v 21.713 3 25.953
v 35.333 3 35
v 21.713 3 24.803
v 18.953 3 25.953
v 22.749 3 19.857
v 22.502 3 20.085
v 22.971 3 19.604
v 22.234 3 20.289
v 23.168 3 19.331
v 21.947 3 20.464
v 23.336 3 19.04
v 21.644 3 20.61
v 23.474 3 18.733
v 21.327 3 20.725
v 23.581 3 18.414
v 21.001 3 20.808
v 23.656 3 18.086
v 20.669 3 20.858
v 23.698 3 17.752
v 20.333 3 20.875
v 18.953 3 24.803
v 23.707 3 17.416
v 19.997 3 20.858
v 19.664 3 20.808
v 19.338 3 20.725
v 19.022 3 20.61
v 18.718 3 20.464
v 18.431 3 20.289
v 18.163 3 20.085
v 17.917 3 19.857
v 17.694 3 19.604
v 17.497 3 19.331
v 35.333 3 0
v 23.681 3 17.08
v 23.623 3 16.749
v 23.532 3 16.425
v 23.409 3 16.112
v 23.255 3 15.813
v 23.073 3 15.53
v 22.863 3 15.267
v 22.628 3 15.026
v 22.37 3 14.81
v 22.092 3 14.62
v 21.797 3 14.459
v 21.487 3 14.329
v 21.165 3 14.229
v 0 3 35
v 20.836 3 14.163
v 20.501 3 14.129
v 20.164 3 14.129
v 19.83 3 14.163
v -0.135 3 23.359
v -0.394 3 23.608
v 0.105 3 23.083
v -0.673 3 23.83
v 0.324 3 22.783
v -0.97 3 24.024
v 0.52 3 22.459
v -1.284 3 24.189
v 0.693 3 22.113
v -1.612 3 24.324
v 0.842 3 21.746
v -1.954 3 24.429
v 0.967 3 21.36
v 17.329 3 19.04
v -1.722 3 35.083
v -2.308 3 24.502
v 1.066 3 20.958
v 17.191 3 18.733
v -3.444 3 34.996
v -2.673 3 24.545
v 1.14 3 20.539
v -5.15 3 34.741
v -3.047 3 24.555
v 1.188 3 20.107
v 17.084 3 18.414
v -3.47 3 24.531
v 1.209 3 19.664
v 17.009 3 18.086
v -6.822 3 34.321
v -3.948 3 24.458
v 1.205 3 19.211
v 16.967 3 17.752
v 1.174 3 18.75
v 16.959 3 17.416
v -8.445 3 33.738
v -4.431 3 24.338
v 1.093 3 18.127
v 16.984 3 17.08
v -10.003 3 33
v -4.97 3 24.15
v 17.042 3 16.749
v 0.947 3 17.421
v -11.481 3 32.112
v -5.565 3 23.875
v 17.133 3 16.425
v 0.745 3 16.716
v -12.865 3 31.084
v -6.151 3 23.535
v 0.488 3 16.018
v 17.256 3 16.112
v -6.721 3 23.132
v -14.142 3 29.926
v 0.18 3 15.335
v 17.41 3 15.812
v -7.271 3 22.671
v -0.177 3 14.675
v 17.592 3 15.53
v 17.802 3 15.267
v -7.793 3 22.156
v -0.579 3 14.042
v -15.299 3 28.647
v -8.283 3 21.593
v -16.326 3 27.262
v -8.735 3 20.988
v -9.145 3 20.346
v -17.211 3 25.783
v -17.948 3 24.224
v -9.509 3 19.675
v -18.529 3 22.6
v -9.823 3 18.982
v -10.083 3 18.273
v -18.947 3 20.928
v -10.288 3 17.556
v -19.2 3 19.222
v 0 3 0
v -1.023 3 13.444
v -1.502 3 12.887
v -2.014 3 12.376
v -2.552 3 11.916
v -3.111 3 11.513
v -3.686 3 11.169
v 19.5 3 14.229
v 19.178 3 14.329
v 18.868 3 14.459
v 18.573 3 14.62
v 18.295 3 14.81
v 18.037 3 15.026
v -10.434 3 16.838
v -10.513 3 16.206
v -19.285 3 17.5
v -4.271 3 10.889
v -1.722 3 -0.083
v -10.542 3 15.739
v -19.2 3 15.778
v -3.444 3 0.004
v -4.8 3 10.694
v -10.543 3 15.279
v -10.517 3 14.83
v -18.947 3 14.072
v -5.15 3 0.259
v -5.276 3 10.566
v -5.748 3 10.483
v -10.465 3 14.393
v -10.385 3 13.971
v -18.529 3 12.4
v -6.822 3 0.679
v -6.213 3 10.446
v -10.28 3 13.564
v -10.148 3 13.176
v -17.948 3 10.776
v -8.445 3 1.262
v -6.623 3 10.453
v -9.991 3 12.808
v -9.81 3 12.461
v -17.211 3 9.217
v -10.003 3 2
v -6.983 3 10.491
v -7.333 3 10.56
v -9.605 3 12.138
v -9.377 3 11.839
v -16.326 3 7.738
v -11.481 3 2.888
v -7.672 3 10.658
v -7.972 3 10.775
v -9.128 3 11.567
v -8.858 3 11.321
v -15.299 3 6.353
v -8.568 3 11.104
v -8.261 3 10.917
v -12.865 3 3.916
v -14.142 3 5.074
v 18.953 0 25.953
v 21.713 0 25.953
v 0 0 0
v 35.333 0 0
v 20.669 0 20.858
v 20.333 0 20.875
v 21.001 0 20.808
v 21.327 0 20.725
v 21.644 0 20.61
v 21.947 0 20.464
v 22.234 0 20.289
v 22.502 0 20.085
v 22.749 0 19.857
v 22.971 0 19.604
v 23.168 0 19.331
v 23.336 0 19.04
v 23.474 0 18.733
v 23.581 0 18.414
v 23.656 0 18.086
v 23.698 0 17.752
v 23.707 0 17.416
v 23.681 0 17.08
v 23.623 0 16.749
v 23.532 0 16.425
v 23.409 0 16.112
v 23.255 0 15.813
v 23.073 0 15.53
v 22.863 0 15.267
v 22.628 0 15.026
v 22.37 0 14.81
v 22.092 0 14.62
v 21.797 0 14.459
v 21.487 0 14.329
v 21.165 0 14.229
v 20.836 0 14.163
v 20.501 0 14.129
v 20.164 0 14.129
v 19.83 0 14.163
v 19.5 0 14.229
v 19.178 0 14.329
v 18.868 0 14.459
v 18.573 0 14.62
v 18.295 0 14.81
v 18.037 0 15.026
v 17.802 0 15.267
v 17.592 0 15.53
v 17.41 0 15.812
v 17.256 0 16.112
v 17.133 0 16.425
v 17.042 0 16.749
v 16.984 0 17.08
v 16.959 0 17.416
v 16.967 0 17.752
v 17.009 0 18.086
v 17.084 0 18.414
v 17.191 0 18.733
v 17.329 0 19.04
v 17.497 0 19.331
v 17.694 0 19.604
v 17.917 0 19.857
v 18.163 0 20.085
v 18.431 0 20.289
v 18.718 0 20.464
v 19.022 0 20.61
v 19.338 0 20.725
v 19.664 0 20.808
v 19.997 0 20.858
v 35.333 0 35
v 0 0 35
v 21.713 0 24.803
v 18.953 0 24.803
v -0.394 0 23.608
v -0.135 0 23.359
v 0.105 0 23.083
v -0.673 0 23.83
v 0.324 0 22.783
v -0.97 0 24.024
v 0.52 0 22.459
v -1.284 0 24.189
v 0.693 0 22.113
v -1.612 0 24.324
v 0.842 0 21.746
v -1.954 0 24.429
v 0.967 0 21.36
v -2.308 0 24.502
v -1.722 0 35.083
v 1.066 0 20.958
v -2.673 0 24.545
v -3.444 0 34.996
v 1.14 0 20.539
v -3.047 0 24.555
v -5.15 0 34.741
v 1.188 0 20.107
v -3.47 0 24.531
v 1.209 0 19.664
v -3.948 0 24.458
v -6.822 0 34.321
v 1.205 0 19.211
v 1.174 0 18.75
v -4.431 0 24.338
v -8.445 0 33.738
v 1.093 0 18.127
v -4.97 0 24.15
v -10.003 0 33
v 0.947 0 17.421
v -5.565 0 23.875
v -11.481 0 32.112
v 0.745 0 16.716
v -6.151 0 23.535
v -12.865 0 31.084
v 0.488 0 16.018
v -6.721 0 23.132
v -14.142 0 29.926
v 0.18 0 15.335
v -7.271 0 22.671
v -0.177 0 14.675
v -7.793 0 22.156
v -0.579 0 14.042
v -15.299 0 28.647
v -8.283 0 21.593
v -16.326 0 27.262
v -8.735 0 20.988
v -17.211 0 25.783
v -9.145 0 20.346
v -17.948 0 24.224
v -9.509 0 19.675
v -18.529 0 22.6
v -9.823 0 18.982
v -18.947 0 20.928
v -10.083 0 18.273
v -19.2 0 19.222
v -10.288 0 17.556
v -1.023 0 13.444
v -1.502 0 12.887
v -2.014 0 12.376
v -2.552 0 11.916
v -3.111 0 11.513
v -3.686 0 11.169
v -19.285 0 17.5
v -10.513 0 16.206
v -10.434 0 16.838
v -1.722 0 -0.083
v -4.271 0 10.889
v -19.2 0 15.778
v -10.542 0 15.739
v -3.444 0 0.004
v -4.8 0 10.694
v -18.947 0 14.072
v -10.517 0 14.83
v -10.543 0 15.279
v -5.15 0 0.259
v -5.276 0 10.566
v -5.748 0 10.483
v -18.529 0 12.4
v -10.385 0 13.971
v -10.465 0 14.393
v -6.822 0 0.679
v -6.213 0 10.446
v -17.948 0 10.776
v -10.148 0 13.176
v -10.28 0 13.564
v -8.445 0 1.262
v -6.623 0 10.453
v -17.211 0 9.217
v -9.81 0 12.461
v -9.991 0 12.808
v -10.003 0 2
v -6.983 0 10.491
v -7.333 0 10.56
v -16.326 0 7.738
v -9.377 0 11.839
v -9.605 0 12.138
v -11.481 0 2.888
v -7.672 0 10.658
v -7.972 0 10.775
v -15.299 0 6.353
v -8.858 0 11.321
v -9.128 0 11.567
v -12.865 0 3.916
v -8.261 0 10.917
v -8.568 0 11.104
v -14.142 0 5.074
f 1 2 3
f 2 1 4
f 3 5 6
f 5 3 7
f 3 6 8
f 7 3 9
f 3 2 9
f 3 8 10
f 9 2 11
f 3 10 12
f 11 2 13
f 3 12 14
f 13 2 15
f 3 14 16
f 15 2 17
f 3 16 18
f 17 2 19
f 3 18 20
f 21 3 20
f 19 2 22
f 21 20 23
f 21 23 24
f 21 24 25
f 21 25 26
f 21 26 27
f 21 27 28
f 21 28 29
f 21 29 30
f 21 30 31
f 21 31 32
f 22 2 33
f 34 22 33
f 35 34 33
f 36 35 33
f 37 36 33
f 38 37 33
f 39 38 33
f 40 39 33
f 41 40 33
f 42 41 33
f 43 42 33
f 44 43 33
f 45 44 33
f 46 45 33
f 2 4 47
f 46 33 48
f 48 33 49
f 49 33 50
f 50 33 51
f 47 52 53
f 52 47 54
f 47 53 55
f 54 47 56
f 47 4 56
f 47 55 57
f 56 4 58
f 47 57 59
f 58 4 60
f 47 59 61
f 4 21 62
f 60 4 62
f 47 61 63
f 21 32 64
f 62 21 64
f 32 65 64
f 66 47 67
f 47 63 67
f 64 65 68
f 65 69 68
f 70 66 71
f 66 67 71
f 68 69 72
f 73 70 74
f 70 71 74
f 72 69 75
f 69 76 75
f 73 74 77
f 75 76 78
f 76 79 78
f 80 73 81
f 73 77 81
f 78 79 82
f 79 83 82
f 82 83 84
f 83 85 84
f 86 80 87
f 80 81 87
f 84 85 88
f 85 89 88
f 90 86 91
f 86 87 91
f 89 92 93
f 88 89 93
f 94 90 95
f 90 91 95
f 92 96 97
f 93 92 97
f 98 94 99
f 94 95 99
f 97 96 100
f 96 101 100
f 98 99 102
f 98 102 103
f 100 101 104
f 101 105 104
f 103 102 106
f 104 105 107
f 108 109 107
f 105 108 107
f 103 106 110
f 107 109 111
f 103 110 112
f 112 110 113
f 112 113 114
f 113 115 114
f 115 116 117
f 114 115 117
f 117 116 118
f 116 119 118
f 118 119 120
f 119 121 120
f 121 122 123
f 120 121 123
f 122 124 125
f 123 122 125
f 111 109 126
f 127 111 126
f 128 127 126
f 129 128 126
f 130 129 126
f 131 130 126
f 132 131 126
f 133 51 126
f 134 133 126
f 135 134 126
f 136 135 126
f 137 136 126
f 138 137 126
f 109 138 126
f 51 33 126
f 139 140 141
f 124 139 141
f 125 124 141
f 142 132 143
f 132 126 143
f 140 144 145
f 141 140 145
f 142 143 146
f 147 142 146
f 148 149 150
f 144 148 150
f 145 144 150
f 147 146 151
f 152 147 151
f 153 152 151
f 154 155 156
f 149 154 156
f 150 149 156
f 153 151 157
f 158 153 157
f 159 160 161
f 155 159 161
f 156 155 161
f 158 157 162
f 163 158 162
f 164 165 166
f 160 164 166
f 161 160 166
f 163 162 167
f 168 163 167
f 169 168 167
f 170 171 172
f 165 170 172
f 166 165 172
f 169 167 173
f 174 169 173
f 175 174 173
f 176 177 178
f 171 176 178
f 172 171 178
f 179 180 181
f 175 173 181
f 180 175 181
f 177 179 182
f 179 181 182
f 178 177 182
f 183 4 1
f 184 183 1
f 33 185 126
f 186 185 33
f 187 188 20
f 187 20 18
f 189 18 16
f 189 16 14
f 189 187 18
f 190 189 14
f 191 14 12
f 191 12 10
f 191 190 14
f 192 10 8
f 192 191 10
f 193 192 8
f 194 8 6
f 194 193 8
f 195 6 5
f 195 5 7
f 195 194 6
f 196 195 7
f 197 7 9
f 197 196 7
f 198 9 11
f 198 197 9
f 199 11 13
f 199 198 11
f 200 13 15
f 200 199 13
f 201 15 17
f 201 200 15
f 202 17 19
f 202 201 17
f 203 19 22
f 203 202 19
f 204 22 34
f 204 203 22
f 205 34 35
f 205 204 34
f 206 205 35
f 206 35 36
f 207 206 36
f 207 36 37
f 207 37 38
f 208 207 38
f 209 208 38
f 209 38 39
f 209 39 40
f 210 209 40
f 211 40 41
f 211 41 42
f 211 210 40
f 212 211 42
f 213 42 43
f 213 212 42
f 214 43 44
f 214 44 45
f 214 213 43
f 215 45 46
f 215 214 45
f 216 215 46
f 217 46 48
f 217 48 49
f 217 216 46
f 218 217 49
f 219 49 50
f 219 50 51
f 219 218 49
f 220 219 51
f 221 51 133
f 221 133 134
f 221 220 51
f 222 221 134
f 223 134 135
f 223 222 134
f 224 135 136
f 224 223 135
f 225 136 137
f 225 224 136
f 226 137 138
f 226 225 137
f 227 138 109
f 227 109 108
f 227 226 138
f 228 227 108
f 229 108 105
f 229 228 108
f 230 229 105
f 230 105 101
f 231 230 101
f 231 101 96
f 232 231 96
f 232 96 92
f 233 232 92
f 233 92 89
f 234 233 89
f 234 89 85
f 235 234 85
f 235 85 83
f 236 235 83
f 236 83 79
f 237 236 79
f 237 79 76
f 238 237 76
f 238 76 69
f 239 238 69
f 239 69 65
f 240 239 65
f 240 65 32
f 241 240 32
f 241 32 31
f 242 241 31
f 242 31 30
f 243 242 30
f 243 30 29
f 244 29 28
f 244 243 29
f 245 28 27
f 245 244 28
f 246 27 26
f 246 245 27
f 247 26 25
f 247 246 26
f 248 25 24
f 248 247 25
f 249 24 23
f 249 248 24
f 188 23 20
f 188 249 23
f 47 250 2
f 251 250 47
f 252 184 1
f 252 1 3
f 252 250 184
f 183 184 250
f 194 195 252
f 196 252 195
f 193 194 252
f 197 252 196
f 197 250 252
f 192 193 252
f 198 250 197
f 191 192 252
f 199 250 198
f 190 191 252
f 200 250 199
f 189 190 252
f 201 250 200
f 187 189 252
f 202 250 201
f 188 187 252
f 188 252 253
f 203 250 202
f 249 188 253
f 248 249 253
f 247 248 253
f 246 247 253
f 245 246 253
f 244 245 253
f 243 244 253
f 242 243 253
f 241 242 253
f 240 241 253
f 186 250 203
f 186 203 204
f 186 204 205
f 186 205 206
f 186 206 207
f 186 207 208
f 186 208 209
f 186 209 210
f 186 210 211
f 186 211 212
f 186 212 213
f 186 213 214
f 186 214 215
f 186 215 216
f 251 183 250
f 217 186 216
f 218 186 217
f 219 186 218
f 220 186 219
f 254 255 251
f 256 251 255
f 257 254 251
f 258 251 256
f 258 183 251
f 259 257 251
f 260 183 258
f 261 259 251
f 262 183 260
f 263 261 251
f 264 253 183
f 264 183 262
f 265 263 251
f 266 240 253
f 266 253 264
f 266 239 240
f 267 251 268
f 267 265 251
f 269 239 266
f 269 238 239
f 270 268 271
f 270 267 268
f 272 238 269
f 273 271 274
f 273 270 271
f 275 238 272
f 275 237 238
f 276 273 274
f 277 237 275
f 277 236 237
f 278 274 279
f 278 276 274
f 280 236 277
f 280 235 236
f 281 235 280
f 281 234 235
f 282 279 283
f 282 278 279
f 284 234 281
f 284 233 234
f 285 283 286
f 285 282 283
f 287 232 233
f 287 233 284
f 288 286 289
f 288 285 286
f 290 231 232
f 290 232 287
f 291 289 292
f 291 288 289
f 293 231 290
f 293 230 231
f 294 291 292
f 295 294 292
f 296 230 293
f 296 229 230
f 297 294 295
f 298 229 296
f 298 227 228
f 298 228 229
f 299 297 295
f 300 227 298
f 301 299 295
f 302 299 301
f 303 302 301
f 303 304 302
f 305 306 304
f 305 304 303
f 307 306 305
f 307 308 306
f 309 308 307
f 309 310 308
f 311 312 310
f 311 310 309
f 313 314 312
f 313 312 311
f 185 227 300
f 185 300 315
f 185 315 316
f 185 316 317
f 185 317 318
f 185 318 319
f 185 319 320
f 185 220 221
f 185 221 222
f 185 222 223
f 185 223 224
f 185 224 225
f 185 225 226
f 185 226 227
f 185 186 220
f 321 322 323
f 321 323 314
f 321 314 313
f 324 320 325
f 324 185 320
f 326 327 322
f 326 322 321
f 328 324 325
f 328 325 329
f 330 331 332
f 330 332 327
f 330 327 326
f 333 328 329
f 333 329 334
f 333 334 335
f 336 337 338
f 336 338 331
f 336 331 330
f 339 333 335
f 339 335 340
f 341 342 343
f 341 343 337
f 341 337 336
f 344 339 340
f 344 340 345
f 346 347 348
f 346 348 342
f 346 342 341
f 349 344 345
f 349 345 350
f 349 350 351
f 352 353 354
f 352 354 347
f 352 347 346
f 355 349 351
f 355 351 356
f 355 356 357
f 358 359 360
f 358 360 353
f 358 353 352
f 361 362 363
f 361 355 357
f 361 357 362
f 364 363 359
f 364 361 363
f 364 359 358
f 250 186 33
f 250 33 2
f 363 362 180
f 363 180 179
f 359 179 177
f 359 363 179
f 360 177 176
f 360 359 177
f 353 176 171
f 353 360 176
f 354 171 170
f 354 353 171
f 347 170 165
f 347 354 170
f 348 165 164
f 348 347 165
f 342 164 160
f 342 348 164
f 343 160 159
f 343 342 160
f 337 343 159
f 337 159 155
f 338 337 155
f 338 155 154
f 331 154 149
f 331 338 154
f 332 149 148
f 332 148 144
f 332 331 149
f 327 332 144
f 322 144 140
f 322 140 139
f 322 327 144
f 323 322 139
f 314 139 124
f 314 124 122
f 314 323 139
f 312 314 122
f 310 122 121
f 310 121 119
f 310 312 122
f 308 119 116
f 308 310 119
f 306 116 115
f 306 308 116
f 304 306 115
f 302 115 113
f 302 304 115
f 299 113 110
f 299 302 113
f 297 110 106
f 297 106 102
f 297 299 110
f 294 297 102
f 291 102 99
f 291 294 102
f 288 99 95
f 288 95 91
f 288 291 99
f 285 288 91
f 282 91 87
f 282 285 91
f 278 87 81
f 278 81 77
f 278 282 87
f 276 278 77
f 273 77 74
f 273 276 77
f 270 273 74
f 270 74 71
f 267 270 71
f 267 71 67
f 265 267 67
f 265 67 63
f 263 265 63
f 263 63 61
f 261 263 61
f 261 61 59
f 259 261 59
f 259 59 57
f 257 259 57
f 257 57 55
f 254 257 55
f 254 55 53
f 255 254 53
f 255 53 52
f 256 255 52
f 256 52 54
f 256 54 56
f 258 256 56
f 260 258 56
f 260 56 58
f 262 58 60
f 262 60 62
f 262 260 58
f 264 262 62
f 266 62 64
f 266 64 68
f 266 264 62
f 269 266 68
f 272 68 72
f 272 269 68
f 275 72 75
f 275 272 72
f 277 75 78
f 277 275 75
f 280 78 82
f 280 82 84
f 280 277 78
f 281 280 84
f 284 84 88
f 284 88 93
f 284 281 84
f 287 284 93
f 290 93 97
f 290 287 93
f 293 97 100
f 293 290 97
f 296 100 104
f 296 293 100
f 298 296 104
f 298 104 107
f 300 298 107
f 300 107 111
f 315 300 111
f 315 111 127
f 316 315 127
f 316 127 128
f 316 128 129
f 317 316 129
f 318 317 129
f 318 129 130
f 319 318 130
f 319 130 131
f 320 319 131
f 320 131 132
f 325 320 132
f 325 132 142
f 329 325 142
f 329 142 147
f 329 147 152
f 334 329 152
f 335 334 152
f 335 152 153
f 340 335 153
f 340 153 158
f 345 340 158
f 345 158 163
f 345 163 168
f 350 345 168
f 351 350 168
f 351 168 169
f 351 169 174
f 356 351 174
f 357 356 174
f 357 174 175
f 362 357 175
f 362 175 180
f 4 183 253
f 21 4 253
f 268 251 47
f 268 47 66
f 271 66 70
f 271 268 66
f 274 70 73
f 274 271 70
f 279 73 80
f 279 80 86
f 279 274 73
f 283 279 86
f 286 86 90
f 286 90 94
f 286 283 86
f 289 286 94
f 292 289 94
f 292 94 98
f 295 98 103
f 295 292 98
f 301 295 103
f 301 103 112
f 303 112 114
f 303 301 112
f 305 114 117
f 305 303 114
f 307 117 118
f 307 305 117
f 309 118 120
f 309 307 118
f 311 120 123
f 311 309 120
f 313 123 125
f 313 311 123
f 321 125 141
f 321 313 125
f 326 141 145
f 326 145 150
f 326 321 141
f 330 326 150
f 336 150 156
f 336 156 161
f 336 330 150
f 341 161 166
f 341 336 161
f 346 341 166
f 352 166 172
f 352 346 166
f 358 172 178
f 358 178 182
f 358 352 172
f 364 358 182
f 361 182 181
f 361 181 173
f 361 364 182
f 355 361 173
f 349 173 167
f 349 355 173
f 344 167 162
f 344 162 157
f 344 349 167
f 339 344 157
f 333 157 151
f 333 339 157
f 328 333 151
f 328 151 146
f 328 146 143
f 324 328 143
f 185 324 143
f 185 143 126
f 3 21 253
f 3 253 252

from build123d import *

# Parameters (mm, degrees)
SKETCH1_R           = 3.375
SKETCH1_RX          = 7.5
SKETCH1_RY          = 5.3
SKETCH1_W           = 2.76
SKETCH1_H           = 1.15
BOSS_EXTRUDE1_DEPTH = 3


with BuildPart() as part:
    # Sketch1 → Boss-Extrude1 (new body)
    with BuildSketch(Plane(origin=(0, 0, 0), x_dir=(1, 0, 0), z_dir=(0, 1, 0))):
        with BuildLine():
            Line((0, 0), (35.332576055, 0))
            Line((35.332576055, 0), (35.332576055, -35))
            Line((35.332576055, -35), (0, -35))
            ThreePointArc((0, -35), (-19.284551552, -17.5), (0, 0))
        make_face()
        with Locations(Location((20.332576055, -17.5, 0), (0, 0, 270))):
            Circle(SKETCH1_R, mode=Mode.SUBTRACT)
        with Locations(Location((-4.667423945, -17.5), (0, 0, 118.629649839))):
            Ellipse(SKETCH1_RX, SKETCH1_RY, mode=Mode.SUBTRACT)
        with Locations((20.332576055, -25.378095587)):
            Rectangle(SKETCH1_W, SKETCH1_H, mode=Mode.SUBTRACT)
    extrude(amount=BOSS_EXTRUDE1_DEPTH)


solid = part.part
